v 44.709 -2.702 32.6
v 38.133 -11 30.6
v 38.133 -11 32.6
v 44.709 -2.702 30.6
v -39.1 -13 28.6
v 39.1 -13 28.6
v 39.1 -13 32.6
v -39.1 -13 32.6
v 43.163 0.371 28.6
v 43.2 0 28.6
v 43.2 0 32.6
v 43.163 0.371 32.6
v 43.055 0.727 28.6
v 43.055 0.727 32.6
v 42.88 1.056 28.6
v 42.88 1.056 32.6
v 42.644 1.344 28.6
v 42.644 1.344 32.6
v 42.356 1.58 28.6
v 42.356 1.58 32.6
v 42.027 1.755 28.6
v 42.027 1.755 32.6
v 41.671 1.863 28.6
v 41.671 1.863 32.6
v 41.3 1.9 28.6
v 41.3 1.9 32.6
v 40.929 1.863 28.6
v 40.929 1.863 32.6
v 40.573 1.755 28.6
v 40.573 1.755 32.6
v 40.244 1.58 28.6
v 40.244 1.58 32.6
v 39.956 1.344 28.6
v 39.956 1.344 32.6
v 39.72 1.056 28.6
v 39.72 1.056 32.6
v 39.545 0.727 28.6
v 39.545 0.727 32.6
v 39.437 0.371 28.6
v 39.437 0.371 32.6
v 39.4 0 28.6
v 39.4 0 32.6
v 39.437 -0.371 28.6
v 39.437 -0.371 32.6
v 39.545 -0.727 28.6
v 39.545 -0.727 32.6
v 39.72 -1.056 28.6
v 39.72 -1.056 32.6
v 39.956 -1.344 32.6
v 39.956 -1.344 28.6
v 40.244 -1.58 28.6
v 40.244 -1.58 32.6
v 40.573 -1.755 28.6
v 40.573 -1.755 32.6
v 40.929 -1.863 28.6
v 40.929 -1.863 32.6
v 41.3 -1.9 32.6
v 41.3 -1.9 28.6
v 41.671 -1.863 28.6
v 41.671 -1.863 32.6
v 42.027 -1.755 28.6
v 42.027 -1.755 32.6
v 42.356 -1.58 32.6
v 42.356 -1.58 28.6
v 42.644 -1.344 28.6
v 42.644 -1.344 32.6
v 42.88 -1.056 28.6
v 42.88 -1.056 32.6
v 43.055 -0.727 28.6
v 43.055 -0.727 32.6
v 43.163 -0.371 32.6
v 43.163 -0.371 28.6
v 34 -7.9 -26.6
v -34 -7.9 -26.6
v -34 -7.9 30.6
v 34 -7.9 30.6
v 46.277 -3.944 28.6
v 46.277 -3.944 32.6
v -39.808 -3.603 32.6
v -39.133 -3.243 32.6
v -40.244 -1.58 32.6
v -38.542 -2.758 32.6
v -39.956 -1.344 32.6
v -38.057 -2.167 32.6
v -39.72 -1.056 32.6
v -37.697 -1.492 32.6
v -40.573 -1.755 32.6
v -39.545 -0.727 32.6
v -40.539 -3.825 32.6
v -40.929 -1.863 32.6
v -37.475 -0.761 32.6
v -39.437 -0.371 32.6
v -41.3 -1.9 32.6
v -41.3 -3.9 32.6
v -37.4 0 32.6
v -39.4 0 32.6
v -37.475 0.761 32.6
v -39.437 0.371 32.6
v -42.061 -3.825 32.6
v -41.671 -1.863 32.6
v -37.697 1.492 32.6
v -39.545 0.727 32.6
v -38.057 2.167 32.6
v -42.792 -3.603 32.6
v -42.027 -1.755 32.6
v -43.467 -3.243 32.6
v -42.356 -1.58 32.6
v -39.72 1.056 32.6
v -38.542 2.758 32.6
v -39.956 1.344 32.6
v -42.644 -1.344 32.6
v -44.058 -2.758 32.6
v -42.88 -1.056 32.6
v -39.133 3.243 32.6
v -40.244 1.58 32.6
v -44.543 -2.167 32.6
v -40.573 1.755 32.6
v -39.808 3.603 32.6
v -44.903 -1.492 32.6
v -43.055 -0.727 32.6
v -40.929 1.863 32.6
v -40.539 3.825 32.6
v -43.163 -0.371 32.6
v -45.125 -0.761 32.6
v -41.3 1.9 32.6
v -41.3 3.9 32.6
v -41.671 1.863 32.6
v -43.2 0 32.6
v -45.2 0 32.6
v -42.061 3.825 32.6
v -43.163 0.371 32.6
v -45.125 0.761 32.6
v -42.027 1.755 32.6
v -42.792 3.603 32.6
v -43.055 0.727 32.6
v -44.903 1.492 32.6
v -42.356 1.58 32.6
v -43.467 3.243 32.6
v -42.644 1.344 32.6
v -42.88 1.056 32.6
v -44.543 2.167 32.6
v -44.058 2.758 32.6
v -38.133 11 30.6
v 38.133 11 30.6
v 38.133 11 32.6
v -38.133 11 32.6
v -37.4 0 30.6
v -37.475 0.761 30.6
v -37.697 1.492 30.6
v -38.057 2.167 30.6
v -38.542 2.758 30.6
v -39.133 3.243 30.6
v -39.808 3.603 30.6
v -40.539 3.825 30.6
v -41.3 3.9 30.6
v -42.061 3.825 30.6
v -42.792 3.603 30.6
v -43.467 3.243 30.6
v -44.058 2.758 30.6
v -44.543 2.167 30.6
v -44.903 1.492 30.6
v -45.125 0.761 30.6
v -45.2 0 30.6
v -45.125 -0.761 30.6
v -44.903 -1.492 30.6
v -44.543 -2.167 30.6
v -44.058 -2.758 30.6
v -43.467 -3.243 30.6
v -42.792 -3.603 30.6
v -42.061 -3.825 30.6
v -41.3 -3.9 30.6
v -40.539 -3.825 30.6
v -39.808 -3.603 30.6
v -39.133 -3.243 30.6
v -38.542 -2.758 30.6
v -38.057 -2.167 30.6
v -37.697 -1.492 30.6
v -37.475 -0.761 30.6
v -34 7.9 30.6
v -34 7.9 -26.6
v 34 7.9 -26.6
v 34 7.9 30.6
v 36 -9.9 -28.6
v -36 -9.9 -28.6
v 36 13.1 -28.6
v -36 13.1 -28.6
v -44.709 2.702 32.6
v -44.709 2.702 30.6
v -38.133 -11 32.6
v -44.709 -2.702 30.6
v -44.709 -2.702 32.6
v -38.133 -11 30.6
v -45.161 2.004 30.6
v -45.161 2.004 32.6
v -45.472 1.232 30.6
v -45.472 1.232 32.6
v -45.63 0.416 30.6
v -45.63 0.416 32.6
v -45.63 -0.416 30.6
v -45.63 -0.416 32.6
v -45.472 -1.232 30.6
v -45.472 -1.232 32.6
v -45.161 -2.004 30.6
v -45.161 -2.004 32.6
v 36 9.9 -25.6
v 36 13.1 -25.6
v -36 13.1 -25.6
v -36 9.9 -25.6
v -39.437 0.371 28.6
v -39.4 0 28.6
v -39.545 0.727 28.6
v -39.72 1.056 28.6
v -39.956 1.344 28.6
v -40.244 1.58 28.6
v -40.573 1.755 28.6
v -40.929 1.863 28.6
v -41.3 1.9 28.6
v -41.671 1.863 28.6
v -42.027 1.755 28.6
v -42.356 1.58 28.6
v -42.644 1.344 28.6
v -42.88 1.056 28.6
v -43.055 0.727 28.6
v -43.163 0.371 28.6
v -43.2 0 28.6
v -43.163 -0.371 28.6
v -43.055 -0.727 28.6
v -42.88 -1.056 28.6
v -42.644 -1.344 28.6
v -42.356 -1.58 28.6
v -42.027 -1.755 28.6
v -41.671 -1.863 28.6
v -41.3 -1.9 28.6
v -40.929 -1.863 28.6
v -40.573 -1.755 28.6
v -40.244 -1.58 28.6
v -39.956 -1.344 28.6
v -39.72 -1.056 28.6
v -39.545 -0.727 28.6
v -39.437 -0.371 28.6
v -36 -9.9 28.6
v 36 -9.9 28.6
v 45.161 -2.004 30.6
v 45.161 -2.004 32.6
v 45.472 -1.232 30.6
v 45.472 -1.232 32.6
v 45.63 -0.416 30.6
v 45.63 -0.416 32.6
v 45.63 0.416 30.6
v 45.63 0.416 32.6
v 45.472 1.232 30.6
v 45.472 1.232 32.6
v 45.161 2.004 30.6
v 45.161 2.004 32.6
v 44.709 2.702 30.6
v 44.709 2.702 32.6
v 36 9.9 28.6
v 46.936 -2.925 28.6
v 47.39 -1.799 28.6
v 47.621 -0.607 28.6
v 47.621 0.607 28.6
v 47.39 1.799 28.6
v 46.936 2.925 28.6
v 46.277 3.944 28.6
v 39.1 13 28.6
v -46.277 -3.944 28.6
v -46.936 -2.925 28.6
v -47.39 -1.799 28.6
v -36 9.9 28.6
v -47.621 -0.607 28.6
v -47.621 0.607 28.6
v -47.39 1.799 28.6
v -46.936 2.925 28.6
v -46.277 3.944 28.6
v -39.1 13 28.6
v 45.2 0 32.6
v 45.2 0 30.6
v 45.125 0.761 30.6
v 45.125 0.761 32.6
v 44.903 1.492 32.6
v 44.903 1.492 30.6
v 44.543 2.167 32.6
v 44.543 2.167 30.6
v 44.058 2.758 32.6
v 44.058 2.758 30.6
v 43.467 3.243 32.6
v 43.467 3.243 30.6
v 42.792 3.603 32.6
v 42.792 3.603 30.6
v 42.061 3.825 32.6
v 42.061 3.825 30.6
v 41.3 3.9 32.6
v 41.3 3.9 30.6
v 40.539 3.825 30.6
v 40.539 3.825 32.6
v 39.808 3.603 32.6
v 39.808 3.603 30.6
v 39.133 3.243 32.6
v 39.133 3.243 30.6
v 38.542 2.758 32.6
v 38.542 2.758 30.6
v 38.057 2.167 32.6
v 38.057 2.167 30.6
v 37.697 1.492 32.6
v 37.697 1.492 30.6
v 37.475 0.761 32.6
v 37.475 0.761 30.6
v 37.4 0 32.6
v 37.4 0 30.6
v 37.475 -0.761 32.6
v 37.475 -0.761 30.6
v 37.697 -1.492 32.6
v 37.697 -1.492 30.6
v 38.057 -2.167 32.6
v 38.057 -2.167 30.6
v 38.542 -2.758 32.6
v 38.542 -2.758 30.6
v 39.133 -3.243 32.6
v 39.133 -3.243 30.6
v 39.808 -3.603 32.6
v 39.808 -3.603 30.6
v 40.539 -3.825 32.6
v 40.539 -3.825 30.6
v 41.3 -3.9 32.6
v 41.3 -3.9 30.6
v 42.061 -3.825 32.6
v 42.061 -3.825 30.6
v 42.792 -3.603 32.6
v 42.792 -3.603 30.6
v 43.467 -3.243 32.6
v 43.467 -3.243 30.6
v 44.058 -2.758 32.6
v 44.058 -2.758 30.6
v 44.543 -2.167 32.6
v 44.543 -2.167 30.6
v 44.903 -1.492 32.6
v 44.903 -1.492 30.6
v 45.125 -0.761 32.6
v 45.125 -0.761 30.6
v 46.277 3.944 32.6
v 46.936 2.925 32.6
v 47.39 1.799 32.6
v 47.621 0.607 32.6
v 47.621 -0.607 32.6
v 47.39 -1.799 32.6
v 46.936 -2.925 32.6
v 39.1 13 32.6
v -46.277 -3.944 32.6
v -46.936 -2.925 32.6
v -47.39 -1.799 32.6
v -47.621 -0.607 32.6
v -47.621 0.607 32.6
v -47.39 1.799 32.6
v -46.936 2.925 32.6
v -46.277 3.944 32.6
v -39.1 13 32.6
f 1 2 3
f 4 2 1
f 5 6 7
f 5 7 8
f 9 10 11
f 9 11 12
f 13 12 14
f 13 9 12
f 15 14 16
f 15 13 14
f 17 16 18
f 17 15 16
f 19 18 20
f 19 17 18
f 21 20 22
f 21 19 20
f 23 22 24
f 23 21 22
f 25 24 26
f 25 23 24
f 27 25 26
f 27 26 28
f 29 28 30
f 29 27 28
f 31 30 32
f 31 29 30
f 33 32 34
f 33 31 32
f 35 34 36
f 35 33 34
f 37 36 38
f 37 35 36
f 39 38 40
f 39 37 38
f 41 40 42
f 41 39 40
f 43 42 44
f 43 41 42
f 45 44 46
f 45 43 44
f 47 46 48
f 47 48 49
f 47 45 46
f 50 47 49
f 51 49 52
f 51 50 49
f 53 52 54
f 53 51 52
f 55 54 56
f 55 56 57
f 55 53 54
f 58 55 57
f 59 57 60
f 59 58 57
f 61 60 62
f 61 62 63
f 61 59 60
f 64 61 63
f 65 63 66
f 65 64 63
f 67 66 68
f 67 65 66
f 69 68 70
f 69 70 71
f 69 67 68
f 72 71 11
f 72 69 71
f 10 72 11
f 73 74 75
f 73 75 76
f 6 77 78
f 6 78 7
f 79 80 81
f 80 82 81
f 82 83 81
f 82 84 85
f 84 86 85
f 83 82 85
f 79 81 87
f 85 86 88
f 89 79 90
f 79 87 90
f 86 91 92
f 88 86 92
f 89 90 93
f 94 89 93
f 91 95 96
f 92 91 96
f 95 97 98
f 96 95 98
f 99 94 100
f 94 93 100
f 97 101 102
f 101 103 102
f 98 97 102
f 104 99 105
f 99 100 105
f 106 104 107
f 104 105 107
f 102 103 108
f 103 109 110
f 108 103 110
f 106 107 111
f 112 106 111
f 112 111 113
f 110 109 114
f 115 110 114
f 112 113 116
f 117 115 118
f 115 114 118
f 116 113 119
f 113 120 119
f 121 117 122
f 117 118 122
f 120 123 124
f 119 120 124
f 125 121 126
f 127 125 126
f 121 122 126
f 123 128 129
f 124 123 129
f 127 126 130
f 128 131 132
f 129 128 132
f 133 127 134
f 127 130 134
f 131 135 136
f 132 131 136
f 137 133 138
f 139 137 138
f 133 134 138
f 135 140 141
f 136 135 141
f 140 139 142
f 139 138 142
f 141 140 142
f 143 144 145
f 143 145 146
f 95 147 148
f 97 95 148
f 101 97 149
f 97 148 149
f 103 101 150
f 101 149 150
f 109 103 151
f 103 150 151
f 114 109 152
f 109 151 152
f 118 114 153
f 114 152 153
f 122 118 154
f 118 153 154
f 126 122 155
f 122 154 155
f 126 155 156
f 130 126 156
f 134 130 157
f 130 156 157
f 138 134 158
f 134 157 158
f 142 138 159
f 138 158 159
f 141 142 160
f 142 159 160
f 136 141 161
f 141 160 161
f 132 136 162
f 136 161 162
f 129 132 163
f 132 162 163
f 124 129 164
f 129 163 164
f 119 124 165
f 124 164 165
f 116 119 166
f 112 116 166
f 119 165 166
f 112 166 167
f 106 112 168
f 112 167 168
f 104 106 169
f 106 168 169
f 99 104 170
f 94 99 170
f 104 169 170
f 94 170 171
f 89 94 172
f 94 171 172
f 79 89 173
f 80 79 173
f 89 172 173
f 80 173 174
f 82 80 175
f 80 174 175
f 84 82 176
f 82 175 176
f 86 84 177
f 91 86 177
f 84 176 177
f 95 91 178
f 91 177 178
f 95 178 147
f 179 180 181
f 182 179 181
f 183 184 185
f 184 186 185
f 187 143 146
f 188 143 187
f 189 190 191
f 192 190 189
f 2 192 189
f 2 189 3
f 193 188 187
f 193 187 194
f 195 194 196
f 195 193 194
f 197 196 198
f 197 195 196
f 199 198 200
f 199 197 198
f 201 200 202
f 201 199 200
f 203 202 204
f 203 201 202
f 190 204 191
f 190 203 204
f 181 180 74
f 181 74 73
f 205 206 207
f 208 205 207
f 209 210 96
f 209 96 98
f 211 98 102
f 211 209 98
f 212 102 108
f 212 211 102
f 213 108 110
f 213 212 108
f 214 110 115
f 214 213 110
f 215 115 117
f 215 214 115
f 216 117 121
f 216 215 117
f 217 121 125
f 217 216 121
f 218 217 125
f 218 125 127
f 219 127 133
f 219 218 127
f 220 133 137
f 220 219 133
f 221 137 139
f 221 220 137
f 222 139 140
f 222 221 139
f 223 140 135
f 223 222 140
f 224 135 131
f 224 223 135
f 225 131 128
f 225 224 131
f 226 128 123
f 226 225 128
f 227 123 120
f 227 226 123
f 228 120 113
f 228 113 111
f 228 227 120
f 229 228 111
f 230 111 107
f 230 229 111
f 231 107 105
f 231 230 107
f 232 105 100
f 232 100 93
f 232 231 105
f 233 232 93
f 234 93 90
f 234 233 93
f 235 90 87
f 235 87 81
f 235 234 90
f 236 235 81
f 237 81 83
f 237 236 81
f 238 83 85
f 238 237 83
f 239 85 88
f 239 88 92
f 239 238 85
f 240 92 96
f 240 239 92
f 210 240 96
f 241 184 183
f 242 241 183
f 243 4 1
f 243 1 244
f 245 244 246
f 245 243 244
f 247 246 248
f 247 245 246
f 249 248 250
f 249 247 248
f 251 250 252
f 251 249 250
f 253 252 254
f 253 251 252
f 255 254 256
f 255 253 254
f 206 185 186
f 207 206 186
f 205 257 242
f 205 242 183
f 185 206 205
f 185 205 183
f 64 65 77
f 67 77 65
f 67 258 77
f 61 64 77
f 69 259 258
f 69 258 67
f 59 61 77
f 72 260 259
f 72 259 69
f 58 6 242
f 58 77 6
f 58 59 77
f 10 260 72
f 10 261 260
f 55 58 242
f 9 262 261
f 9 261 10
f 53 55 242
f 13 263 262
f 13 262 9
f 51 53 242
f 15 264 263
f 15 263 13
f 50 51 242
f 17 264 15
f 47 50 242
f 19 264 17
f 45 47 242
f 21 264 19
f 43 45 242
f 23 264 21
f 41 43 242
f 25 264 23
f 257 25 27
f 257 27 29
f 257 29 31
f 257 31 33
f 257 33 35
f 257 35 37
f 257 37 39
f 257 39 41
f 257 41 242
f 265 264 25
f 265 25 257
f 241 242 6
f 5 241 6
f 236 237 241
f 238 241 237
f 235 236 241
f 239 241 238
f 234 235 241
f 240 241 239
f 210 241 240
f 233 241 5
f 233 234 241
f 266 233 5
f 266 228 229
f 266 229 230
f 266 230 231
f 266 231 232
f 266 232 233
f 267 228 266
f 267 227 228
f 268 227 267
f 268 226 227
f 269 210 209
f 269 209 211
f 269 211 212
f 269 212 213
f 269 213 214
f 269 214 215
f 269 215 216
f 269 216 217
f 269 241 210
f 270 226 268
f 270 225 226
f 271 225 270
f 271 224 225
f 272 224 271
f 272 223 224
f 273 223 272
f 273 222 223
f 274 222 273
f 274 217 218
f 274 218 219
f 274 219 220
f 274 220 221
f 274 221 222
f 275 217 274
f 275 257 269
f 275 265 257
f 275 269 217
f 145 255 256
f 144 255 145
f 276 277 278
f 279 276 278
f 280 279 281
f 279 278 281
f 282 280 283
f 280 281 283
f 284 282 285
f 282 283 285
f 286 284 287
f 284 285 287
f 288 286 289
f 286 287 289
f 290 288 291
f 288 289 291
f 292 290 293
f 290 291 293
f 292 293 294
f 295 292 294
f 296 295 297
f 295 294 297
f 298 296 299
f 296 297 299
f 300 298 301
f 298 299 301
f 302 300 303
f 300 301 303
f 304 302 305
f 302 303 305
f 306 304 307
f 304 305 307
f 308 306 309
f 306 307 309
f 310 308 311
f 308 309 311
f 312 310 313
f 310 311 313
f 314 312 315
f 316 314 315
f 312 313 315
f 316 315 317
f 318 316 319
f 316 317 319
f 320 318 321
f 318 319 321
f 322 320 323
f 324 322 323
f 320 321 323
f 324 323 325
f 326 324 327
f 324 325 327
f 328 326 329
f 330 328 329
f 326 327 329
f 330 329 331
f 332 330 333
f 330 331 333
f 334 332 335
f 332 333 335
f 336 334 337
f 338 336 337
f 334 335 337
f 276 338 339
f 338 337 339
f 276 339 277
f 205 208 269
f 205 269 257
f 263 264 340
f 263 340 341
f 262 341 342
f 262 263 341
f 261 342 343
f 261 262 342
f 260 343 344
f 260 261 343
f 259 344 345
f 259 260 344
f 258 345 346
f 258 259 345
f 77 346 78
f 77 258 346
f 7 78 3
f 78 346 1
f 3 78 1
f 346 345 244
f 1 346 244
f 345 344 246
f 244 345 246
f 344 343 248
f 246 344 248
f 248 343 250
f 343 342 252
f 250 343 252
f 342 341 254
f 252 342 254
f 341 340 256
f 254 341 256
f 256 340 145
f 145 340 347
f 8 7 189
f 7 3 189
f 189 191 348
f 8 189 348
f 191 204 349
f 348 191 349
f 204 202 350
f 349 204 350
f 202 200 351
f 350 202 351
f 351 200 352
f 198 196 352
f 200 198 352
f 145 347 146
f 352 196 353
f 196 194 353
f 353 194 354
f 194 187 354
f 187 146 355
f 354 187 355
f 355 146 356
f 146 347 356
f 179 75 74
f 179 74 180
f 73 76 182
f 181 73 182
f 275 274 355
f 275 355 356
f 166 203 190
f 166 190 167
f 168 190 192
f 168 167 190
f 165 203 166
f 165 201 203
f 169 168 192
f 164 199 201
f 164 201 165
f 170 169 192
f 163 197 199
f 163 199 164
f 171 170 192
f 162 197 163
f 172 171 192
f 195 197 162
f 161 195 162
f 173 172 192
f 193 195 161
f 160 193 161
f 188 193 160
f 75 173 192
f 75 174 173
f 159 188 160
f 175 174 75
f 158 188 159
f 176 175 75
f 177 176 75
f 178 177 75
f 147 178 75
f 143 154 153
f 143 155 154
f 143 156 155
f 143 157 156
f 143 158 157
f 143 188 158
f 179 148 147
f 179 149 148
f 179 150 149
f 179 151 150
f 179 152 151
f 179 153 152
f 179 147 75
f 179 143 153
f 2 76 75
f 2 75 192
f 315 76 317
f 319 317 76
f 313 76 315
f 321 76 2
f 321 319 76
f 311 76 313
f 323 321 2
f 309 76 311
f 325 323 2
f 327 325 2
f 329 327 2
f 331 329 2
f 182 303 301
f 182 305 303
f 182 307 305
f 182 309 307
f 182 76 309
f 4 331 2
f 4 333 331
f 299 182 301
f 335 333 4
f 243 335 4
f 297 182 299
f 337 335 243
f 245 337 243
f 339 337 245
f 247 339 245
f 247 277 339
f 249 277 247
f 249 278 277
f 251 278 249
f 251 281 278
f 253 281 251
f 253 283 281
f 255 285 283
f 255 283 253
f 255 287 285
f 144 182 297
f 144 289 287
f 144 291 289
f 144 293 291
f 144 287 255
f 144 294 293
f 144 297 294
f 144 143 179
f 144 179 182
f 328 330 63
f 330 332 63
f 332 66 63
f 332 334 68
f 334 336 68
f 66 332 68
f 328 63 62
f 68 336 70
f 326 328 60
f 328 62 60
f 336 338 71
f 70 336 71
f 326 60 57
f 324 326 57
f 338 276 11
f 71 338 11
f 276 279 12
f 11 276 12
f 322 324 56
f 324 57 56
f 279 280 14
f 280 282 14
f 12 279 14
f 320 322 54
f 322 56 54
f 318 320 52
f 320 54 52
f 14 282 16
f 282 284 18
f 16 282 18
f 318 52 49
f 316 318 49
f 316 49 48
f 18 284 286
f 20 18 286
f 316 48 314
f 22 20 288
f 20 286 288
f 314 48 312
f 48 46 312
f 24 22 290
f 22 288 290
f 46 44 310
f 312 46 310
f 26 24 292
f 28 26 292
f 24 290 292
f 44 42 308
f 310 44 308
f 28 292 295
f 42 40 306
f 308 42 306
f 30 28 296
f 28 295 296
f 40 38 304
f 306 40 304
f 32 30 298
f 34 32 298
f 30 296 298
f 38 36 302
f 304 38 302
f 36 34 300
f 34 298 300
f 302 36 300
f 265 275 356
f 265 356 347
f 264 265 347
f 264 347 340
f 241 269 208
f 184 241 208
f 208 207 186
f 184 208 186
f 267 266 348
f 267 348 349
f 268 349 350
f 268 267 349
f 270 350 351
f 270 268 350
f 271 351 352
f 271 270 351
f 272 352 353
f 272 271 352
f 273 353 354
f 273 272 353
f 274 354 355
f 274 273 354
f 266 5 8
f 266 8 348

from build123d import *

# Parameters (mm, degrees)
SKETCH1_W           = 72
SKETCH1_H           = 57.2
BOSS_EXTRUDE1_DEPTH = 9.9
SKETCH2_R           = 1.9
BOSS_EXTRUDE2_DEPTH = 4
SKETCH4_W           = 72
SKETCH4_H           = 23
BOSS_EXTRUDE3_DEPTH = 3
SHELL1_START        = -26.6
SHELL1_OUTLINE_W    = 68
SHELL1_OUTLINE_H    = 15.8
SHELL1_DEPTH        = 59.2
SHELL1_START_2      = 30.6
SHELL1_2_OUTLINE_R  = 3.9
SHELL1_2_OUTLINE_W  = 68
SHELL1_2_OUTLINE_H  = 15.8
SHELL1_2_DEPTH      = 2


# Read off the part's stored shape, not the designer's step: Shell1
with BuildPart() as part:
    # Sketch1 → Boss-Extrude1 (new, symmetric)
    with BuildSketch(Plane(origin=(0, 0, 0), x_dir=(1, 0, 0), z_dir=(0, 1, 0))):
        Rectangle(SKETCH1_W, SKETCH1_H)
    extrude(amount=BOSS_EXTRUDE1_DEPTH, both=True)

    # Sketch2 → Boss-Extrude2 (add)
    with BuildSketch(Plane.XY.offset(28.6)):
        with BuildLine():
            Line((-39.1, 13), (39.1, 13))
            Line((39.1, 13), (46.276725004, 3.94394577))
            ThreePointArc((46.276725004, 3.94394577), (47.65, 0), (46.276725004, -3.94394577))
            Line((46.276725004, -3.94394577), (39.1, -13))
            Line((39.1, -13), (-39.1, -13))
            Line((-39.1, -13), (-46.276725004, -3.94394577))
            ThreePointArc((-46.276725004, -3.94394577), (-47.65, 0), (-46.276725004, 3.94394577))
            Line((-46.276725004, 3.94394577), (-39.1, 13))
        make_face()
        with Locations((-41.3, 0)):
            Circle(SKETCH2_R, mode=Mode.SUBTRACT)
        with Locations((41.3, 0)):
            Circle(SKETCH2_R, mode=Mode.SUBTRACT)
    extrude(amount=BOSS_EXTRUDE2_DEPTH)

    # Sketch4 → Boss-Extrude3 (add)
    with BuildSketch(Plane(origin=(0, 0, -28.6), x_dir=(-1, 0, 0), z_dir=(0, 0, -1))):
        with Locations((0, 1.6)):
            Rectangle(SKETCH4_W, SKETCH4_H)
    extrude(amount=-BOSS_EXTRUDE3_DEPTH)

    # Shell1 outline → Shell1 (cut)
    with BuildSketch(Plane.XY.offset(SHELL1_START)):
        Rectangle(SHELL1_OUTLINE_W, SHELL1_OUTLINE_H)
    extrude(amount=SHELL1_DEPTH, mode=Mode.SUBTRACT)

    # Shell1 2 outline → Shell1 2 (cut)
    with BuildSketch(Plane.XY.offset(SHELL1_START_2)):
        with BuildLine():
            Line((-38.133077283, 11), (-44.709252562, 2.701758126))
            ThreePointArc((-44.709252562, 2.701758126), (-45.65, 0), (-44.709252562, -2.701758126))
            Line((-44.709252562, -2.701758126), (-38.133077283, -11))
            Line((-38.133077283, -11), (38.133077283, -11))
            Line((38.133077283, -11), (44.709252562, -2.701758126))
            ThreePointArc((44.709252562, -2.701758126), (45.65, 0), (44.709252562, 2.701758126))
            Line((44.709252562, 2.701758126), (38.133077283, 11))
            Line((38.133077283, 11), (-38.133077283, 11))
        make_face()
        with Locations((-41.3, 0)):
            Circle(SHELL1_2_OUTLINE_R, mode=Mode.SUBTRACT)
        Rectangle(SHELL1_2_OUTLINE_W, SHELL1_2_OUTLINE_H, mode=Mode.SUBTRACT)
        with Locations((41.3, 0)):
            Circle(SHELL1_2_OUTLINE_R, mode=Mode.SUBTRACT)
    extrude(amount=SHELL1_2_DEPTH, mode=Mode.SUBTRACT)


solid = part.part
